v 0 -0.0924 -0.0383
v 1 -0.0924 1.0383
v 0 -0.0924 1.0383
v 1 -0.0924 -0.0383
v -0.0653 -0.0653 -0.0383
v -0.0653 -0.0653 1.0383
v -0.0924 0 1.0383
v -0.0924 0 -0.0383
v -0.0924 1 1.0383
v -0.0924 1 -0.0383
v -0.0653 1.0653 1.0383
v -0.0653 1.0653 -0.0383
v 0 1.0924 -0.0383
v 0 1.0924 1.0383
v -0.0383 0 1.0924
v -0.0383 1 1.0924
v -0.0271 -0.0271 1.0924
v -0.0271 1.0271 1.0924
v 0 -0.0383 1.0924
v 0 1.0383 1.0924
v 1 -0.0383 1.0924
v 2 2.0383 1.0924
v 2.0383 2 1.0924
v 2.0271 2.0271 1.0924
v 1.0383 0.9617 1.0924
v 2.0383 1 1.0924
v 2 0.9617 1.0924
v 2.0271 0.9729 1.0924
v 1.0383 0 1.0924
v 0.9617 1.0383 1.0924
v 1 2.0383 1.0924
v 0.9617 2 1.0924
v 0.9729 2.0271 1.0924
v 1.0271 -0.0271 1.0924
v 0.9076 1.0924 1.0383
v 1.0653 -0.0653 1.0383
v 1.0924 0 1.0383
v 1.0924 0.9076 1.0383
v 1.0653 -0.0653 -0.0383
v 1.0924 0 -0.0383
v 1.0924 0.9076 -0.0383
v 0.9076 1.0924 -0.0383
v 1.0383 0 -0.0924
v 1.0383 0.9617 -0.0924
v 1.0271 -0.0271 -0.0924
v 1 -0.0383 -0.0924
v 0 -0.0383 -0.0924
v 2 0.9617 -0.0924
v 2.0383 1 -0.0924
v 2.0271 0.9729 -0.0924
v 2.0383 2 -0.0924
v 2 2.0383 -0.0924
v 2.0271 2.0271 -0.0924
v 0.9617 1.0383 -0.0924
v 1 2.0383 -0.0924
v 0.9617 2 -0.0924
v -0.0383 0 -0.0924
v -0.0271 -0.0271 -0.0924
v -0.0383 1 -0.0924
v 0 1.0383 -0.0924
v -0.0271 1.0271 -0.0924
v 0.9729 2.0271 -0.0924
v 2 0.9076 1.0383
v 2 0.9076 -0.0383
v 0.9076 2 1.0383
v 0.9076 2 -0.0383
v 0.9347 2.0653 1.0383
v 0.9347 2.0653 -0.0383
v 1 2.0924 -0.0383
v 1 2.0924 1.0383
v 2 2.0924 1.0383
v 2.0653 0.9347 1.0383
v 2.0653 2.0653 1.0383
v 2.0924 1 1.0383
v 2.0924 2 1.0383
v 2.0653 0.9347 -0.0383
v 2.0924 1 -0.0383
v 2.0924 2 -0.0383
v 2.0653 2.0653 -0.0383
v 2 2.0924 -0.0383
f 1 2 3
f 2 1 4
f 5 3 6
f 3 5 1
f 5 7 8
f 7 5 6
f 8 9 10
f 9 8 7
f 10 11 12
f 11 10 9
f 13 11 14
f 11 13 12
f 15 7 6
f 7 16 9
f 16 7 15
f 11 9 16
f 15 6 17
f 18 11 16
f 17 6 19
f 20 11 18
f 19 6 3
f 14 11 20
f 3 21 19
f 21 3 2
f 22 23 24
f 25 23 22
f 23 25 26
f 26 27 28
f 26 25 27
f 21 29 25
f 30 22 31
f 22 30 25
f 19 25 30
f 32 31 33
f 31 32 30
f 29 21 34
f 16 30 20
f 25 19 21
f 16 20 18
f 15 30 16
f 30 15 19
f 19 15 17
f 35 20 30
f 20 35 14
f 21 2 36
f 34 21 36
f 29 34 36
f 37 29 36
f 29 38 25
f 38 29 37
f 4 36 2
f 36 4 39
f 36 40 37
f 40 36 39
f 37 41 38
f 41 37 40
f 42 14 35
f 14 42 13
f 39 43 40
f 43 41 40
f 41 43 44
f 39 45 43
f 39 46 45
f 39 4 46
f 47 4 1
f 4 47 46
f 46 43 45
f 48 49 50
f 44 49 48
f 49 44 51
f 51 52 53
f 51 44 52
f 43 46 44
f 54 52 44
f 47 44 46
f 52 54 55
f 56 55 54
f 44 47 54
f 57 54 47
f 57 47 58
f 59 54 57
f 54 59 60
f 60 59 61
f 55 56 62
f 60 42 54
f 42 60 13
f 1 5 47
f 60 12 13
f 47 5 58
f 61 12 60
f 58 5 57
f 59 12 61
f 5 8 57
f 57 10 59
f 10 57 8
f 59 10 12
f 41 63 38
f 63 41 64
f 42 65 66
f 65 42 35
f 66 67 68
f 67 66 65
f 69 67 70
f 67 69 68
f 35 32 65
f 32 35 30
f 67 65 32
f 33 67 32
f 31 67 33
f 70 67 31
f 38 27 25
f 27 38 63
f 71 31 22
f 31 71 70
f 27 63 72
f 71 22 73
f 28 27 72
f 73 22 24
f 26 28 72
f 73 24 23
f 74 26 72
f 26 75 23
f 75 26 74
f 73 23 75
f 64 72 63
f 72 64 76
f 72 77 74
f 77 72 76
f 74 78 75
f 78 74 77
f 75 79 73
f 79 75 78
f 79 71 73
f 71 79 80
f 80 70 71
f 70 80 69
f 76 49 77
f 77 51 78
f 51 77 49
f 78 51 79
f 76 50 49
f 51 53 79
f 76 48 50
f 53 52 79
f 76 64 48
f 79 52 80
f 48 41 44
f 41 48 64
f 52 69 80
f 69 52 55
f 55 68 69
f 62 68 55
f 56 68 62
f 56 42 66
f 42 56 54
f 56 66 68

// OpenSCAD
minkowski() {
  union() {
    cube();
    translate([1,1,0]) cube();
  }
  sphere(0.1, $fn=8);
}
